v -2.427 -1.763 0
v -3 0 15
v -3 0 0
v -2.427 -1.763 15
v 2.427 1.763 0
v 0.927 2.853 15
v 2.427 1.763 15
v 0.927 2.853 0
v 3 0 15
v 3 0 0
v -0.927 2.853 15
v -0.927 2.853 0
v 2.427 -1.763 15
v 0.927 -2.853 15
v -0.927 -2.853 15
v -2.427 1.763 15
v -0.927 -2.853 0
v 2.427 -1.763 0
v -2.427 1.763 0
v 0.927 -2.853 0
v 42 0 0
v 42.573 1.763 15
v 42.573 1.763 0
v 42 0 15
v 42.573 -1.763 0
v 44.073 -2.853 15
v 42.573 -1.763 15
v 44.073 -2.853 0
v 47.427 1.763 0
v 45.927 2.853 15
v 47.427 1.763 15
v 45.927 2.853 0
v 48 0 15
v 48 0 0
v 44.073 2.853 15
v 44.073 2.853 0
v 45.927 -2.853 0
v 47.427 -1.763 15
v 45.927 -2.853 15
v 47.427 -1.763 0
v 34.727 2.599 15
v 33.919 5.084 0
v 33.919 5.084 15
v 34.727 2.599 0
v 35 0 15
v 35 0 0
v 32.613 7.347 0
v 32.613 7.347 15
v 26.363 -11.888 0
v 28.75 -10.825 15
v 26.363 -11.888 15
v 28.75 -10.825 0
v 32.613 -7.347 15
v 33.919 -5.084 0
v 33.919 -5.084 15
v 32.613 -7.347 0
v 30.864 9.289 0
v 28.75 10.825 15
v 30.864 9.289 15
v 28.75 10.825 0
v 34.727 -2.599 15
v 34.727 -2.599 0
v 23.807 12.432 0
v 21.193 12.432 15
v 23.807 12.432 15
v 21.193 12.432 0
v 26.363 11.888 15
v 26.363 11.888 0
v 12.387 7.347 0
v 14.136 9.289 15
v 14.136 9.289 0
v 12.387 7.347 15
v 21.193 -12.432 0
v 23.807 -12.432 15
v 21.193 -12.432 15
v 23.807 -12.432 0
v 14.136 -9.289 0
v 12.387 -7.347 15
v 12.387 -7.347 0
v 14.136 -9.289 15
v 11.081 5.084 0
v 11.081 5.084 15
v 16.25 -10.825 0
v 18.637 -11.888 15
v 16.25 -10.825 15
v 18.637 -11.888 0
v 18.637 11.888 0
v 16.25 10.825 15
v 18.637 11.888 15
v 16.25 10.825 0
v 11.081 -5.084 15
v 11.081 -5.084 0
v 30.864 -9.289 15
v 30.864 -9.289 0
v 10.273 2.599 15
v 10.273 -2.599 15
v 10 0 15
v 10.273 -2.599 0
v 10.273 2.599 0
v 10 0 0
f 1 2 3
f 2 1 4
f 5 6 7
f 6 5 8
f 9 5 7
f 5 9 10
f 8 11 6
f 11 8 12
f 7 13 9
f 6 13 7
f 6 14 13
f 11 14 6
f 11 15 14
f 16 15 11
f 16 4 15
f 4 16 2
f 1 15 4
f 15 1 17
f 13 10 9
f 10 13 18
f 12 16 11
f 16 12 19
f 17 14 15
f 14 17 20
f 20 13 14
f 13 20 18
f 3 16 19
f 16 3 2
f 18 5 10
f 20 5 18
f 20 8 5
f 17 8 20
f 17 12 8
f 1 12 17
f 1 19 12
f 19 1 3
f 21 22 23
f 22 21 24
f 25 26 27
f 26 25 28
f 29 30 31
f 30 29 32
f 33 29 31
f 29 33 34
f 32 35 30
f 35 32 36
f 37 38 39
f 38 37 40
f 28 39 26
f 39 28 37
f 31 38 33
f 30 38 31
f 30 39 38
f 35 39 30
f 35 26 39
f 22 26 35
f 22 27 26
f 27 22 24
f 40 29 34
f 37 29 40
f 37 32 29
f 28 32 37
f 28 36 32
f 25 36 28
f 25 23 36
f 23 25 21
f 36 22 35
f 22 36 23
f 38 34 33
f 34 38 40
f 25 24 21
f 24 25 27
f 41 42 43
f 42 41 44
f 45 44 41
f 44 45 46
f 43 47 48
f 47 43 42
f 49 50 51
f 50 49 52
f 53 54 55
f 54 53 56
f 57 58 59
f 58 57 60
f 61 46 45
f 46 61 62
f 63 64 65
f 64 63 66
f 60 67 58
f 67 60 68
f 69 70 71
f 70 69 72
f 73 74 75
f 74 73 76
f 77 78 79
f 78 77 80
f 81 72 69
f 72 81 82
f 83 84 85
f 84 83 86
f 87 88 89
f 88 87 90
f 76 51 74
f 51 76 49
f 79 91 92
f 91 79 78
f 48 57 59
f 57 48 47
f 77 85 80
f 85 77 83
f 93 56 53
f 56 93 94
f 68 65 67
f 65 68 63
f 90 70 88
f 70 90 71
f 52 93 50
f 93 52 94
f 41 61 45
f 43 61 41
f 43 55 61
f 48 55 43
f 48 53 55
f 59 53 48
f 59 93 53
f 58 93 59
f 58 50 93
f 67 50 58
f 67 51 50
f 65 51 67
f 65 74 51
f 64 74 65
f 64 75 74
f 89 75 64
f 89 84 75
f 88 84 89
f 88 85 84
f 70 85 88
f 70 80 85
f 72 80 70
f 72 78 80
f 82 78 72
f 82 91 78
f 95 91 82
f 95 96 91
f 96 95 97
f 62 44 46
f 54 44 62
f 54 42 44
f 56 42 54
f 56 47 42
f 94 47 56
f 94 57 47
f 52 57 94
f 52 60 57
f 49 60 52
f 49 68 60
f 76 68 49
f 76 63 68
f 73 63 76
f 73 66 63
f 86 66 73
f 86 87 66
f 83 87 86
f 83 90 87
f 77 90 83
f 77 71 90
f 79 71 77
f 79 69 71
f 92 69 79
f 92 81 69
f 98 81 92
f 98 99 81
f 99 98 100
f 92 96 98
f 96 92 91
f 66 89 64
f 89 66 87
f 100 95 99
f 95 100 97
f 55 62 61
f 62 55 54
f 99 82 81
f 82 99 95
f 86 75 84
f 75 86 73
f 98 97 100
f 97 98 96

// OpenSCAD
M6hole = 3; //use radius
HoleDist = 45;
BaseHeight = 15;
IntakeHole = 25/2;//use radius
cylinder(BaseHeight,M6hole,M6hole);
 {translate([HoleDist,0,0])
	cylinder(BaseHeight,M6hole,M6hole);
	}
{	translate([HoleDist/2,0,0])
	cylinder(BaseHeight,IntakeHole,IntakeHole);
	}
